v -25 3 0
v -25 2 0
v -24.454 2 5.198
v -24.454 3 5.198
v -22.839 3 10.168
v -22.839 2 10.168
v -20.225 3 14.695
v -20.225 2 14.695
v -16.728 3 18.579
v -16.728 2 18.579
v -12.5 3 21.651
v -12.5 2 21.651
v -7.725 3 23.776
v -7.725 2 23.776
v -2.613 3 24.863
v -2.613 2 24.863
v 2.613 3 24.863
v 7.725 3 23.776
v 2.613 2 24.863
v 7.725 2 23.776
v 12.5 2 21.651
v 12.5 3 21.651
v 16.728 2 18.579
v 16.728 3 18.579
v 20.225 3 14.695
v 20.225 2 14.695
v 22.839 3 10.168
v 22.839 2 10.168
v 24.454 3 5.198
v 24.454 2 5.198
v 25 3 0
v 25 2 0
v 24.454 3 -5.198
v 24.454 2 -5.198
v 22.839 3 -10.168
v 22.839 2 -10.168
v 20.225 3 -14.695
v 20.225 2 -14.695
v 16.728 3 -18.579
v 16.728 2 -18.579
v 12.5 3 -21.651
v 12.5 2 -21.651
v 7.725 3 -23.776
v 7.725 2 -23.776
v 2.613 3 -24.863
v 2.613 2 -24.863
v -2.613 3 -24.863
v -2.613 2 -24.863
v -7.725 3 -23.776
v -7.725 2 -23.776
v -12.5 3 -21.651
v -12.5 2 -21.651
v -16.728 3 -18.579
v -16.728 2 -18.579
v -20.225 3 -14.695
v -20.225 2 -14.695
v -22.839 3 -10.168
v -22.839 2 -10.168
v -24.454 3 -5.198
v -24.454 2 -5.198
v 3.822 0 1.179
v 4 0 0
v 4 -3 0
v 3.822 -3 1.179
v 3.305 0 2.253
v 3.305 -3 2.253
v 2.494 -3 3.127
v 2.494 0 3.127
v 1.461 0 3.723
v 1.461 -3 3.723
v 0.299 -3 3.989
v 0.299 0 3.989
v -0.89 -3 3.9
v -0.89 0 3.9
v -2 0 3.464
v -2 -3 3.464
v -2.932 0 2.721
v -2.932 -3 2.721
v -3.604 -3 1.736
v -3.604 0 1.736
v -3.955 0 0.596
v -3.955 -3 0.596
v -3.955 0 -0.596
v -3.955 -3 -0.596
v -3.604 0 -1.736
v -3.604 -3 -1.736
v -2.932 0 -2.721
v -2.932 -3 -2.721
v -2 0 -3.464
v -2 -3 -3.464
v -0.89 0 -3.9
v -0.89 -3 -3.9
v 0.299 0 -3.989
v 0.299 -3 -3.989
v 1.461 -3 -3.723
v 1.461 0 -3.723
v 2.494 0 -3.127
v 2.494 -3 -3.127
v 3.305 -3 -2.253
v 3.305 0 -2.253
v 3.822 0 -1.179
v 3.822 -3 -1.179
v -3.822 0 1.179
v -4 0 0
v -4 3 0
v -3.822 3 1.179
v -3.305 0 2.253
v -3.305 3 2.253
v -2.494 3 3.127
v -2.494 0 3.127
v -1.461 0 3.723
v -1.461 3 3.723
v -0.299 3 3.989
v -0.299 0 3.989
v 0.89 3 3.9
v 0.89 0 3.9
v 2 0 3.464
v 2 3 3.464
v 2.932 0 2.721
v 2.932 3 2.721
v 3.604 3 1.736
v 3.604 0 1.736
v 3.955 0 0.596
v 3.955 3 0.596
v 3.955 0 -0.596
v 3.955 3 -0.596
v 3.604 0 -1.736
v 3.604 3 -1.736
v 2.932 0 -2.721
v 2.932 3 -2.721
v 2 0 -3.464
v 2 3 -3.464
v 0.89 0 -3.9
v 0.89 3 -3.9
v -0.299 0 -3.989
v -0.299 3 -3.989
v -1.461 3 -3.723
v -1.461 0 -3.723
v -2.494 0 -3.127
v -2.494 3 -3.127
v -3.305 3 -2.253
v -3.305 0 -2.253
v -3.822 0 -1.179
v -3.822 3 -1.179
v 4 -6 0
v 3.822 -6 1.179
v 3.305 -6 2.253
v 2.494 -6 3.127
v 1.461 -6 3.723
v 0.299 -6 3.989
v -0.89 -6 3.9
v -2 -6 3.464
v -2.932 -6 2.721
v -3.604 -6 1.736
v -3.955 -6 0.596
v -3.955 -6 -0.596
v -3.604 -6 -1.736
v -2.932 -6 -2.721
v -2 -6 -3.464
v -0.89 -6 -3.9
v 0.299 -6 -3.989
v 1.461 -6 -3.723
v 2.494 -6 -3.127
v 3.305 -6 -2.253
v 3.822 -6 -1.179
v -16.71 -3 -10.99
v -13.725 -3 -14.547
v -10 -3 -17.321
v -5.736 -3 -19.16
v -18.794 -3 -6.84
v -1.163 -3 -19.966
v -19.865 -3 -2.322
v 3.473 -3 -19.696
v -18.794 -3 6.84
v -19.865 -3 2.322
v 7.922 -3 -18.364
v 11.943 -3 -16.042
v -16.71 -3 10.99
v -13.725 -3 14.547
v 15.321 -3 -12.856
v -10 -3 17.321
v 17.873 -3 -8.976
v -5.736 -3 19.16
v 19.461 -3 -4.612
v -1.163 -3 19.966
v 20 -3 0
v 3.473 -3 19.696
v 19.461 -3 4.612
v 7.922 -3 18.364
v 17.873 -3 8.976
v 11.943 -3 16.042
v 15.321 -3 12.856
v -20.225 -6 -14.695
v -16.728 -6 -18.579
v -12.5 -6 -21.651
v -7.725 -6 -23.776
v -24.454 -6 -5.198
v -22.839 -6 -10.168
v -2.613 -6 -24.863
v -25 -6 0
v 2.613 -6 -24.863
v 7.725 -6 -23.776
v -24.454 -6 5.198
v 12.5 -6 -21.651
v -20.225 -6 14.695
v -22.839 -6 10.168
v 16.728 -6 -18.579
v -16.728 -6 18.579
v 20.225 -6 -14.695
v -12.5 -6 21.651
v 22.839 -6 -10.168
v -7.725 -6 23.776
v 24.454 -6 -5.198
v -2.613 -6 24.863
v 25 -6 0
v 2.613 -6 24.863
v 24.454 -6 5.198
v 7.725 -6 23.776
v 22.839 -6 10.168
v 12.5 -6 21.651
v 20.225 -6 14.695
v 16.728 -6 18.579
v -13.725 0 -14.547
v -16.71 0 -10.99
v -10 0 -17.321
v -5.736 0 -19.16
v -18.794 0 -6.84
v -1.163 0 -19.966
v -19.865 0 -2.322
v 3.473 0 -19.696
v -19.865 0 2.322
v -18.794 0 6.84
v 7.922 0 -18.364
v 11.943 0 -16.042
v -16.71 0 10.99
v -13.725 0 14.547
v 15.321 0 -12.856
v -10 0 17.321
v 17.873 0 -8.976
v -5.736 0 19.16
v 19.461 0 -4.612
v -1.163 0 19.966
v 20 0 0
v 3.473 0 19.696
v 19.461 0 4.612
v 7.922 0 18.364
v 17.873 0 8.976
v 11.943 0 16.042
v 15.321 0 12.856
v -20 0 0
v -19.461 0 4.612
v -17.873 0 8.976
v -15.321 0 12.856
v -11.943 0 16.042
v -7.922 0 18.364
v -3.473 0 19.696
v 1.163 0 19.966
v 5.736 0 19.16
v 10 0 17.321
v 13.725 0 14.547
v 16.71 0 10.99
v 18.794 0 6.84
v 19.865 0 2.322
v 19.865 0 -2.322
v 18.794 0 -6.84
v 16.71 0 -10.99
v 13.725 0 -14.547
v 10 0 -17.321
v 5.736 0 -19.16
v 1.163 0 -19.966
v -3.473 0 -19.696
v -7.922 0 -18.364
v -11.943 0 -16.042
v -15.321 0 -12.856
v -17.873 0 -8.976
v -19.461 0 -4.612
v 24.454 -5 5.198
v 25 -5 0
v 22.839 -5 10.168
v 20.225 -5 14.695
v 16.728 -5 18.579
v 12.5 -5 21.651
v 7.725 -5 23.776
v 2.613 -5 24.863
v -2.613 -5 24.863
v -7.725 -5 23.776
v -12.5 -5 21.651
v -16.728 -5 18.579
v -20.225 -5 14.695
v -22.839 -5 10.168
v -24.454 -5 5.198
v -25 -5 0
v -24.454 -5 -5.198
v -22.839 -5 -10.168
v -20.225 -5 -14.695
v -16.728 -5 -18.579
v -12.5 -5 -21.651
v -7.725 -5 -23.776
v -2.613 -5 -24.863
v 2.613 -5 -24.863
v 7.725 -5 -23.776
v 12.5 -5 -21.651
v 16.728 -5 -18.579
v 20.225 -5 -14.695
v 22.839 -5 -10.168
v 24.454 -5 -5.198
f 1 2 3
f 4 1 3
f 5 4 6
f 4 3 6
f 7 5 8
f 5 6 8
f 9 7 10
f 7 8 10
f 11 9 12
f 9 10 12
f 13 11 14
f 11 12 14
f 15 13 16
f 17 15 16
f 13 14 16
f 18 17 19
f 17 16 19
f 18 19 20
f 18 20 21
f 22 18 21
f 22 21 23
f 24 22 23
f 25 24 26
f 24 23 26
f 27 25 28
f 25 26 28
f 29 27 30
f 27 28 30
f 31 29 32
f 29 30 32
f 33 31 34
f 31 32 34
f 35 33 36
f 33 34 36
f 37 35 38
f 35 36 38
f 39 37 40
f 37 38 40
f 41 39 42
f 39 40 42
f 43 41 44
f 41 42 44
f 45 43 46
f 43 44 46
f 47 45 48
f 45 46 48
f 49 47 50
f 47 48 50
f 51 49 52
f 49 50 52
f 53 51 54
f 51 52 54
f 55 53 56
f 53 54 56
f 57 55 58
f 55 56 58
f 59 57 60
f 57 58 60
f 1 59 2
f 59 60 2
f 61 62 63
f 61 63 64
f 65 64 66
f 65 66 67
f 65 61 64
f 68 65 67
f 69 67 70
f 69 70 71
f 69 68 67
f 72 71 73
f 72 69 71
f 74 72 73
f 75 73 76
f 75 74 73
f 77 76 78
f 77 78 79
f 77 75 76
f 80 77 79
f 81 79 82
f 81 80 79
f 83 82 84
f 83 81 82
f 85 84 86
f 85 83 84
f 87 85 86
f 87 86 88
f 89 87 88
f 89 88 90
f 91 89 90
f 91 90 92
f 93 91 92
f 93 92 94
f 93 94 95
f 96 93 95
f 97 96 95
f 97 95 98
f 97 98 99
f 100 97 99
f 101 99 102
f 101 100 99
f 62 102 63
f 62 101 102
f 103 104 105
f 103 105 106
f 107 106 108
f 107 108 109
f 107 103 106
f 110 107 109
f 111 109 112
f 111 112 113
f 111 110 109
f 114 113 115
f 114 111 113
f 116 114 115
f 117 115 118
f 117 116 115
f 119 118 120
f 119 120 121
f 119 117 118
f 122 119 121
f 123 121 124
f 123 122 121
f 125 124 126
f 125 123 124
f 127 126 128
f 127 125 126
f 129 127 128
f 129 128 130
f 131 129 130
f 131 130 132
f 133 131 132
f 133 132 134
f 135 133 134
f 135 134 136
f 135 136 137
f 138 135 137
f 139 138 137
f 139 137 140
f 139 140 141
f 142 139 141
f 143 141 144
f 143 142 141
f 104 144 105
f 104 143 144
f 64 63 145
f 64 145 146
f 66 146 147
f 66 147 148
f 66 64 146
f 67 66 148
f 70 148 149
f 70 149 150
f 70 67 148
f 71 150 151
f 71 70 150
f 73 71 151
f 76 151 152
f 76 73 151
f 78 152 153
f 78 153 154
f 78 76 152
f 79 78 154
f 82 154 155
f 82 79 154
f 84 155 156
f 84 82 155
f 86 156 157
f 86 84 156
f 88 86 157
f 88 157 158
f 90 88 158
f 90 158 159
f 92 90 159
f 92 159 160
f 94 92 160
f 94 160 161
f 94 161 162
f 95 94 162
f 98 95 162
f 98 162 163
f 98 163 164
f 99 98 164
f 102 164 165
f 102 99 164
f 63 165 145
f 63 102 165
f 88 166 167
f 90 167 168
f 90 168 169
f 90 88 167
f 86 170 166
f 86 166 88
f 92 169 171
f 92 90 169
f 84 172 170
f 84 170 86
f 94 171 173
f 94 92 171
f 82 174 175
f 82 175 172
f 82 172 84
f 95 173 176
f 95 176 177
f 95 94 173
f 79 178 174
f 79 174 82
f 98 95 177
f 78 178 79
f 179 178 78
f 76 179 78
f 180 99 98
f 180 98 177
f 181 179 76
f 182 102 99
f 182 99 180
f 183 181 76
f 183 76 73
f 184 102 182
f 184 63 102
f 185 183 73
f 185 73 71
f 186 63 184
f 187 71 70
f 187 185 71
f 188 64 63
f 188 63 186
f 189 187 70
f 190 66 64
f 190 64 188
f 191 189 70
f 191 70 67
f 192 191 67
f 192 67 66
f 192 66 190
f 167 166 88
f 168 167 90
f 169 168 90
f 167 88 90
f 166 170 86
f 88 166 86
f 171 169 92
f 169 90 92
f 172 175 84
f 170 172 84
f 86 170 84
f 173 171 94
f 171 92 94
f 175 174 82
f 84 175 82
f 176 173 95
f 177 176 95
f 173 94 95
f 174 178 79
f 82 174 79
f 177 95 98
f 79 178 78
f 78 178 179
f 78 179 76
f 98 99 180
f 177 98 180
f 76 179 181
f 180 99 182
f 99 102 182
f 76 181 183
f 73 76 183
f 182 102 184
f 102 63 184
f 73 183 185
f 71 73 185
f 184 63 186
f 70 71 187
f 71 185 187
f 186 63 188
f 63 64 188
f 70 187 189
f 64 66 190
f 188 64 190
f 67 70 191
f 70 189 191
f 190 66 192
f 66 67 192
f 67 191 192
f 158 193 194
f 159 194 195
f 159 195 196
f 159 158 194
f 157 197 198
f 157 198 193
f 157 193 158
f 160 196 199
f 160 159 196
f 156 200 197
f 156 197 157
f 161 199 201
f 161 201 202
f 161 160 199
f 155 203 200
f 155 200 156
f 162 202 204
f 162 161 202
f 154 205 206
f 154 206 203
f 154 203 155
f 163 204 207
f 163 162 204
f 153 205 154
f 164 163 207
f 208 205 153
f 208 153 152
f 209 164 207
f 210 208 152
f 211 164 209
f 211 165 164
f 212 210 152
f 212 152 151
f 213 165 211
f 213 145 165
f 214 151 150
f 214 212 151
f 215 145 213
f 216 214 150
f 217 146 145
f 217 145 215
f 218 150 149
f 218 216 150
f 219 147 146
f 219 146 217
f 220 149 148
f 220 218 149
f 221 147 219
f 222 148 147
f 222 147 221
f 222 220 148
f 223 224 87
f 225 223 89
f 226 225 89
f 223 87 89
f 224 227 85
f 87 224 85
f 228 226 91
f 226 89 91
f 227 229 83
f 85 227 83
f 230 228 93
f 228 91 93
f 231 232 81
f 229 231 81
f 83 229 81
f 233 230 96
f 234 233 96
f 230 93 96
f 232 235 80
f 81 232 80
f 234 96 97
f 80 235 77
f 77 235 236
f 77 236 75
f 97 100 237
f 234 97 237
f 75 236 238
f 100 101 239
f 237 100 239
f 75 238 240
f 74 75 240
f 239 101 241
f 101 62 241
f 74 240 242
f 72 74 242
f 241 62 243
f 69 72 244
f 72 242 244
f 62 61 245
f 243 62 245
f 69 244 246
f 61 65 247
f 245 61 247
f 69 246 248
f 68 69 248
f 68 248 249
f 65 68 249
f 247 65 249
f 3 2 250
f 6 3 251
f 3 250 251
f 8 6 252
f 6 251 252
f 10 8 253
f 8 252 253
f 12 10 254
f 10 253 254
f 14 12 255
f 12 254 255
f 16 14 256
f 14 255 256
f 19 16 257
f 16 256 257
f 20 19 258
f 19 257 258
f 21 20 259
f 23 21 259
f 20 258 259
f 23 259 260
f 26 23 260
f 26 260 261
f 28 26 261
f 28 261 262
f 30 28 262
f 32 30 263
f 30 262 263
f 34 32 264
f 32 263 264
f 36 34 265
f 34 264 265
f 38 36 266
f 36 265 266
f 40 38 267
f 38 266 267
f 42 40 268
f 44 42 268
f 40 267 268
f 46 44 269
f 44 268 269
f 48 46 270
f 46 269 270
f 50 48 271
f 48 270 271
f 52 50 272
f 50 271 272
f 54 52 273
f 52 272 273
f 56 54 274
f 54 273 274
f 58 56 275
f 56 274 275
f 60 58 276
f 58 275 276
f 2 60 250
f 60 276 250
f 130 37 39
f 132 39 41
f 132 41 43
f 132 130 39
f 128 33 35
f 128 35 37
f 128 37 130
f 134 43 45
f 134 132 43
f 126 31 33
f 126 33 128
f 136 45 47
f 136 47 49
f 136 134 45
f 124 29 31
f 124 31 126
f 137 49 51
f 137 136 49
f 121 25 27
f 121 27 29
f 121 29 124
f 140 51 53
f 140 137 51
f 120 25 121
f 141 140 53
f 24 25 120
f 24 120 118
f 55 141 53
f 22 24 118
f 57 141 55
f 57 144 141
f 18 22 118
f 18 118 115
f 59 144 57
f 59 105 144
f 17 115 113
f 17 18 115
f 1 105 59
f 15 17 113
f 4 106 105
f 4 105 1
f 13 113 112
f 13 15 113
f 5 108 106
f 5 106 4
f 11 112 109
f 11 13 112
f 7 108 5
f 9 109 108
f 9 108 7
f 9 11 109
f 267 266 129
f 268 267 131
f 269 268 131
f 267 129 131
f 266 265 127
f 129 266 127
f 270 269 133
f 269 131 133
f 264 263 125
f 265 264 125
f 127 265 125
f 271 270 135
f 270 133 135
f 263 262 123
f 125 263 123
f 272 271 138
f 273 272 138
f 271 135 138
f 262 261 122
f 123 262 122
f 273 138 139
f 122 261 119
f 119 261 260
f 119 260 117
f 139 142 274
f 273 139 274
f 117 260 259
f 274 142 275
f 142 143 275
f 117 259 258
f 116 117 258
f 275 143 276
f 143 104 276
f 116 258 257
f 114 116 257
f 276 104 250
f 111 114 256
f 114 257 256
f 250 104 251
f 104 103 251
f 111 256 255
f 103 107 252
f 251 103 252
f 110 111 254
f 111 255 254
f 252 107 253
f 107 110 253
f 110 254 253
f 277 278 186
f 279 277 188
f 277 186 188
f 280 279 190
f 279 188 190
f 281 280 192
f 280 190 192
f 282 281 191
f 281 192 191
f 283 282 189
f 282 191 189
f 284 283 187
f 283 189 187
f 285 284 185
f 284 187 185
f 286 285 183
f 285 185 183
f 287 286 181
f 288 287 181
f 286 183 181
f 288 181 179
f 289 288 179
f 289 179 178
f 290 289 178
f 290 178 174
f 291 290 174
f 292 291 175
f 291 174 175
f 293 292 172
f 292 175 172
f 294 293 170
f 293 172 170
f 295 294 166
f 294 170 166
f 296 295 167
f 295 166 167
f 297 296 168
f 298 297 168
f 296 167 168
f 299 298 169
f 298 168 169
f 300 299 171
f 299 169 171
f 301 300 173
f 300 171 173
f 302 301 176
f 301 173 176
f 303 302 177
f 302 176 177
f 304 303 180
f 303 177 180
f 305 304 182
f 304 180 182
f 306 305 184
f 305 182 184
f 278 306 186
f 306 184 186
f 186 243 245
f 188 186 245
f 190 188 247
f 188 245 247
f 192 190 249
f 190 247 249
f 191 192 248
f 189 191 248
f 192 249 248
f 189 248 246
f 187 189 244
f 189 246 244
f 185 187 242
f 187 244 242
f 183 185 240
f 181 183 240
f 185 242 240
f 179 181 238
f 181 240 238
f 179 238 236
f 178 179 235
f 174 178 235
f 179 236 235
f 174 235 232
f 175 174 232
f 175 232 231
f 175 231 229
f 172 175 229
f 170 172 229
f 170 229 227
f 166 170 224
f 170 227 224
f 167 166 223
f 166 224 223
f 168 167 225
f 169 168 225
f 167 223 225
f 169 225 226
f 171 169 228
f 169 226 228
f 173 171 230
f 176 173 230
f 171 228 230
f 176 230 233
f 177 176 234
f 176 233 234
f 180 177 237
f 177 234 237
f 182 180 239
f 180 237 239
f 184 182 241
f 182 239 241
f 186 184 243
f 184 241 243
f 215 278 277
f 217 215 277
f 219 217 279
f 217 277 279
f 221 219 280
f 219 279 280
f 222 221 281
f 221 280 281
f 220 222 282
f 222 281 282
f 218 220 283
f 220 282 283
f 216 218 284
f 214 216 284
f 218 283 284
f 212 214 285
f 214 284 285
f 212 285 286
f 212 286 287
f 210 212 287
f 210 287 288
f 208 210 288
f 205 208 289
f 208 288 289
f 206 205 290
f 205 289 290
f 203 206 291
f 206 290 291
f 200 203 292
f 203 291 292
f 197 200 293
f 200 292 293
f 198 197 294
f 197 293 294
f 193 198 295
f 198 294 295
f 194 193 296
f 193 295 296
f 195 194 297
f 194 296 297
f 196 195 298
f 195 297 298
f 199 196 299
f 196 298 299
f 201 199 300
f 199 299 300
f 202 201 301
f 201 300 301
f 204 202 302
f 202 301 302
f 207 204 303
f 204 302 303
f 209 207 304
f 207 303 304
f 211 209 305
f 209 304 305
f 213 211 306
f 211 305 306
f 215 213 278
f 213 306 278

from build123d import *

# Parameters (mm, degrees)
F0_R       = 20
F0_R_2     = 4
F1_DEPTH   = 3
F2_R       = 25
F2_R_2     = 20
F2_R_3     = 4
F3_DEPTH   = 3
F4_R       = 25
F4_R_2     = 20
F4_R_3     = 4
F5_DEPTH   = 3
F6_SIZE2   = 5
F6_SIZE    = 2
F6_2_SIZE2 = 5
F6_2_SIZE  = 2


with BuildPart() as f1:
    # F0 (on Front) → F1 (new body)
    with BuildSketch(Plane.XZ):
        Circle(F0_R)
        Circle(F0_R_2, mode=Mode.SUBTRACT)
    extrude(amount=F1_DEPTH)


with BuildPart() as f3:
    # F2 (on face) → F3 (new body)
    with BuildSketch(Plane(origin=(0, 0, 0), x_dir=(-1, 0, 0), z_dir=(0, 1, 0))):
        Circle(F2_R)
        Circle(F2_R_2, mode=Mode.SUBTRACT)
        Circle(F2_R_2)
        Circle(F2_R_3, mode=Mode.SUBTRACT)
    extrude(amount=F3_DEPTH)

    # F6
    f6_edges = [f3.edges().sort_by_distance(p)[0] for p in [
        (25, 0, 0),
    ]]
    f6_side = f3.faces().sort_by_distance((25, 1.5, 0))[0]
    chamfer(f6_edges, length=F6_SIZE, length2=F6_SIZE2, reference=f6_side)


with BuildPart() as f5:
    # F4 (on face) → F5 (new body)
    with BuildSketch(Plane.XZ.offset(3)):
        Circle(F4_R)
        Circle(F4_R_2, mode=Mode.SUBTRACT)
        Circle(F4_R_2)
        Circle(F4_R_3, mode=Mode.SUBTRACT)
    extrude(amount=F5_DEPTH)

    # F6#2
    f6_2_edges = [f5.edges().sort_by_distance(p)[0] for p in [
        (-25, -3, 0),
    ]]
    f6_2_side = f5.faces().sort_by_distance((-25, -4.5, 0))[0]
    chamfer(f6_2_edges, length=F6_2_SIZE, length2=F6_2_SIZE2, reference=f6_2_side)


solid = Compound([f1.part, f3.part, f5.part])
